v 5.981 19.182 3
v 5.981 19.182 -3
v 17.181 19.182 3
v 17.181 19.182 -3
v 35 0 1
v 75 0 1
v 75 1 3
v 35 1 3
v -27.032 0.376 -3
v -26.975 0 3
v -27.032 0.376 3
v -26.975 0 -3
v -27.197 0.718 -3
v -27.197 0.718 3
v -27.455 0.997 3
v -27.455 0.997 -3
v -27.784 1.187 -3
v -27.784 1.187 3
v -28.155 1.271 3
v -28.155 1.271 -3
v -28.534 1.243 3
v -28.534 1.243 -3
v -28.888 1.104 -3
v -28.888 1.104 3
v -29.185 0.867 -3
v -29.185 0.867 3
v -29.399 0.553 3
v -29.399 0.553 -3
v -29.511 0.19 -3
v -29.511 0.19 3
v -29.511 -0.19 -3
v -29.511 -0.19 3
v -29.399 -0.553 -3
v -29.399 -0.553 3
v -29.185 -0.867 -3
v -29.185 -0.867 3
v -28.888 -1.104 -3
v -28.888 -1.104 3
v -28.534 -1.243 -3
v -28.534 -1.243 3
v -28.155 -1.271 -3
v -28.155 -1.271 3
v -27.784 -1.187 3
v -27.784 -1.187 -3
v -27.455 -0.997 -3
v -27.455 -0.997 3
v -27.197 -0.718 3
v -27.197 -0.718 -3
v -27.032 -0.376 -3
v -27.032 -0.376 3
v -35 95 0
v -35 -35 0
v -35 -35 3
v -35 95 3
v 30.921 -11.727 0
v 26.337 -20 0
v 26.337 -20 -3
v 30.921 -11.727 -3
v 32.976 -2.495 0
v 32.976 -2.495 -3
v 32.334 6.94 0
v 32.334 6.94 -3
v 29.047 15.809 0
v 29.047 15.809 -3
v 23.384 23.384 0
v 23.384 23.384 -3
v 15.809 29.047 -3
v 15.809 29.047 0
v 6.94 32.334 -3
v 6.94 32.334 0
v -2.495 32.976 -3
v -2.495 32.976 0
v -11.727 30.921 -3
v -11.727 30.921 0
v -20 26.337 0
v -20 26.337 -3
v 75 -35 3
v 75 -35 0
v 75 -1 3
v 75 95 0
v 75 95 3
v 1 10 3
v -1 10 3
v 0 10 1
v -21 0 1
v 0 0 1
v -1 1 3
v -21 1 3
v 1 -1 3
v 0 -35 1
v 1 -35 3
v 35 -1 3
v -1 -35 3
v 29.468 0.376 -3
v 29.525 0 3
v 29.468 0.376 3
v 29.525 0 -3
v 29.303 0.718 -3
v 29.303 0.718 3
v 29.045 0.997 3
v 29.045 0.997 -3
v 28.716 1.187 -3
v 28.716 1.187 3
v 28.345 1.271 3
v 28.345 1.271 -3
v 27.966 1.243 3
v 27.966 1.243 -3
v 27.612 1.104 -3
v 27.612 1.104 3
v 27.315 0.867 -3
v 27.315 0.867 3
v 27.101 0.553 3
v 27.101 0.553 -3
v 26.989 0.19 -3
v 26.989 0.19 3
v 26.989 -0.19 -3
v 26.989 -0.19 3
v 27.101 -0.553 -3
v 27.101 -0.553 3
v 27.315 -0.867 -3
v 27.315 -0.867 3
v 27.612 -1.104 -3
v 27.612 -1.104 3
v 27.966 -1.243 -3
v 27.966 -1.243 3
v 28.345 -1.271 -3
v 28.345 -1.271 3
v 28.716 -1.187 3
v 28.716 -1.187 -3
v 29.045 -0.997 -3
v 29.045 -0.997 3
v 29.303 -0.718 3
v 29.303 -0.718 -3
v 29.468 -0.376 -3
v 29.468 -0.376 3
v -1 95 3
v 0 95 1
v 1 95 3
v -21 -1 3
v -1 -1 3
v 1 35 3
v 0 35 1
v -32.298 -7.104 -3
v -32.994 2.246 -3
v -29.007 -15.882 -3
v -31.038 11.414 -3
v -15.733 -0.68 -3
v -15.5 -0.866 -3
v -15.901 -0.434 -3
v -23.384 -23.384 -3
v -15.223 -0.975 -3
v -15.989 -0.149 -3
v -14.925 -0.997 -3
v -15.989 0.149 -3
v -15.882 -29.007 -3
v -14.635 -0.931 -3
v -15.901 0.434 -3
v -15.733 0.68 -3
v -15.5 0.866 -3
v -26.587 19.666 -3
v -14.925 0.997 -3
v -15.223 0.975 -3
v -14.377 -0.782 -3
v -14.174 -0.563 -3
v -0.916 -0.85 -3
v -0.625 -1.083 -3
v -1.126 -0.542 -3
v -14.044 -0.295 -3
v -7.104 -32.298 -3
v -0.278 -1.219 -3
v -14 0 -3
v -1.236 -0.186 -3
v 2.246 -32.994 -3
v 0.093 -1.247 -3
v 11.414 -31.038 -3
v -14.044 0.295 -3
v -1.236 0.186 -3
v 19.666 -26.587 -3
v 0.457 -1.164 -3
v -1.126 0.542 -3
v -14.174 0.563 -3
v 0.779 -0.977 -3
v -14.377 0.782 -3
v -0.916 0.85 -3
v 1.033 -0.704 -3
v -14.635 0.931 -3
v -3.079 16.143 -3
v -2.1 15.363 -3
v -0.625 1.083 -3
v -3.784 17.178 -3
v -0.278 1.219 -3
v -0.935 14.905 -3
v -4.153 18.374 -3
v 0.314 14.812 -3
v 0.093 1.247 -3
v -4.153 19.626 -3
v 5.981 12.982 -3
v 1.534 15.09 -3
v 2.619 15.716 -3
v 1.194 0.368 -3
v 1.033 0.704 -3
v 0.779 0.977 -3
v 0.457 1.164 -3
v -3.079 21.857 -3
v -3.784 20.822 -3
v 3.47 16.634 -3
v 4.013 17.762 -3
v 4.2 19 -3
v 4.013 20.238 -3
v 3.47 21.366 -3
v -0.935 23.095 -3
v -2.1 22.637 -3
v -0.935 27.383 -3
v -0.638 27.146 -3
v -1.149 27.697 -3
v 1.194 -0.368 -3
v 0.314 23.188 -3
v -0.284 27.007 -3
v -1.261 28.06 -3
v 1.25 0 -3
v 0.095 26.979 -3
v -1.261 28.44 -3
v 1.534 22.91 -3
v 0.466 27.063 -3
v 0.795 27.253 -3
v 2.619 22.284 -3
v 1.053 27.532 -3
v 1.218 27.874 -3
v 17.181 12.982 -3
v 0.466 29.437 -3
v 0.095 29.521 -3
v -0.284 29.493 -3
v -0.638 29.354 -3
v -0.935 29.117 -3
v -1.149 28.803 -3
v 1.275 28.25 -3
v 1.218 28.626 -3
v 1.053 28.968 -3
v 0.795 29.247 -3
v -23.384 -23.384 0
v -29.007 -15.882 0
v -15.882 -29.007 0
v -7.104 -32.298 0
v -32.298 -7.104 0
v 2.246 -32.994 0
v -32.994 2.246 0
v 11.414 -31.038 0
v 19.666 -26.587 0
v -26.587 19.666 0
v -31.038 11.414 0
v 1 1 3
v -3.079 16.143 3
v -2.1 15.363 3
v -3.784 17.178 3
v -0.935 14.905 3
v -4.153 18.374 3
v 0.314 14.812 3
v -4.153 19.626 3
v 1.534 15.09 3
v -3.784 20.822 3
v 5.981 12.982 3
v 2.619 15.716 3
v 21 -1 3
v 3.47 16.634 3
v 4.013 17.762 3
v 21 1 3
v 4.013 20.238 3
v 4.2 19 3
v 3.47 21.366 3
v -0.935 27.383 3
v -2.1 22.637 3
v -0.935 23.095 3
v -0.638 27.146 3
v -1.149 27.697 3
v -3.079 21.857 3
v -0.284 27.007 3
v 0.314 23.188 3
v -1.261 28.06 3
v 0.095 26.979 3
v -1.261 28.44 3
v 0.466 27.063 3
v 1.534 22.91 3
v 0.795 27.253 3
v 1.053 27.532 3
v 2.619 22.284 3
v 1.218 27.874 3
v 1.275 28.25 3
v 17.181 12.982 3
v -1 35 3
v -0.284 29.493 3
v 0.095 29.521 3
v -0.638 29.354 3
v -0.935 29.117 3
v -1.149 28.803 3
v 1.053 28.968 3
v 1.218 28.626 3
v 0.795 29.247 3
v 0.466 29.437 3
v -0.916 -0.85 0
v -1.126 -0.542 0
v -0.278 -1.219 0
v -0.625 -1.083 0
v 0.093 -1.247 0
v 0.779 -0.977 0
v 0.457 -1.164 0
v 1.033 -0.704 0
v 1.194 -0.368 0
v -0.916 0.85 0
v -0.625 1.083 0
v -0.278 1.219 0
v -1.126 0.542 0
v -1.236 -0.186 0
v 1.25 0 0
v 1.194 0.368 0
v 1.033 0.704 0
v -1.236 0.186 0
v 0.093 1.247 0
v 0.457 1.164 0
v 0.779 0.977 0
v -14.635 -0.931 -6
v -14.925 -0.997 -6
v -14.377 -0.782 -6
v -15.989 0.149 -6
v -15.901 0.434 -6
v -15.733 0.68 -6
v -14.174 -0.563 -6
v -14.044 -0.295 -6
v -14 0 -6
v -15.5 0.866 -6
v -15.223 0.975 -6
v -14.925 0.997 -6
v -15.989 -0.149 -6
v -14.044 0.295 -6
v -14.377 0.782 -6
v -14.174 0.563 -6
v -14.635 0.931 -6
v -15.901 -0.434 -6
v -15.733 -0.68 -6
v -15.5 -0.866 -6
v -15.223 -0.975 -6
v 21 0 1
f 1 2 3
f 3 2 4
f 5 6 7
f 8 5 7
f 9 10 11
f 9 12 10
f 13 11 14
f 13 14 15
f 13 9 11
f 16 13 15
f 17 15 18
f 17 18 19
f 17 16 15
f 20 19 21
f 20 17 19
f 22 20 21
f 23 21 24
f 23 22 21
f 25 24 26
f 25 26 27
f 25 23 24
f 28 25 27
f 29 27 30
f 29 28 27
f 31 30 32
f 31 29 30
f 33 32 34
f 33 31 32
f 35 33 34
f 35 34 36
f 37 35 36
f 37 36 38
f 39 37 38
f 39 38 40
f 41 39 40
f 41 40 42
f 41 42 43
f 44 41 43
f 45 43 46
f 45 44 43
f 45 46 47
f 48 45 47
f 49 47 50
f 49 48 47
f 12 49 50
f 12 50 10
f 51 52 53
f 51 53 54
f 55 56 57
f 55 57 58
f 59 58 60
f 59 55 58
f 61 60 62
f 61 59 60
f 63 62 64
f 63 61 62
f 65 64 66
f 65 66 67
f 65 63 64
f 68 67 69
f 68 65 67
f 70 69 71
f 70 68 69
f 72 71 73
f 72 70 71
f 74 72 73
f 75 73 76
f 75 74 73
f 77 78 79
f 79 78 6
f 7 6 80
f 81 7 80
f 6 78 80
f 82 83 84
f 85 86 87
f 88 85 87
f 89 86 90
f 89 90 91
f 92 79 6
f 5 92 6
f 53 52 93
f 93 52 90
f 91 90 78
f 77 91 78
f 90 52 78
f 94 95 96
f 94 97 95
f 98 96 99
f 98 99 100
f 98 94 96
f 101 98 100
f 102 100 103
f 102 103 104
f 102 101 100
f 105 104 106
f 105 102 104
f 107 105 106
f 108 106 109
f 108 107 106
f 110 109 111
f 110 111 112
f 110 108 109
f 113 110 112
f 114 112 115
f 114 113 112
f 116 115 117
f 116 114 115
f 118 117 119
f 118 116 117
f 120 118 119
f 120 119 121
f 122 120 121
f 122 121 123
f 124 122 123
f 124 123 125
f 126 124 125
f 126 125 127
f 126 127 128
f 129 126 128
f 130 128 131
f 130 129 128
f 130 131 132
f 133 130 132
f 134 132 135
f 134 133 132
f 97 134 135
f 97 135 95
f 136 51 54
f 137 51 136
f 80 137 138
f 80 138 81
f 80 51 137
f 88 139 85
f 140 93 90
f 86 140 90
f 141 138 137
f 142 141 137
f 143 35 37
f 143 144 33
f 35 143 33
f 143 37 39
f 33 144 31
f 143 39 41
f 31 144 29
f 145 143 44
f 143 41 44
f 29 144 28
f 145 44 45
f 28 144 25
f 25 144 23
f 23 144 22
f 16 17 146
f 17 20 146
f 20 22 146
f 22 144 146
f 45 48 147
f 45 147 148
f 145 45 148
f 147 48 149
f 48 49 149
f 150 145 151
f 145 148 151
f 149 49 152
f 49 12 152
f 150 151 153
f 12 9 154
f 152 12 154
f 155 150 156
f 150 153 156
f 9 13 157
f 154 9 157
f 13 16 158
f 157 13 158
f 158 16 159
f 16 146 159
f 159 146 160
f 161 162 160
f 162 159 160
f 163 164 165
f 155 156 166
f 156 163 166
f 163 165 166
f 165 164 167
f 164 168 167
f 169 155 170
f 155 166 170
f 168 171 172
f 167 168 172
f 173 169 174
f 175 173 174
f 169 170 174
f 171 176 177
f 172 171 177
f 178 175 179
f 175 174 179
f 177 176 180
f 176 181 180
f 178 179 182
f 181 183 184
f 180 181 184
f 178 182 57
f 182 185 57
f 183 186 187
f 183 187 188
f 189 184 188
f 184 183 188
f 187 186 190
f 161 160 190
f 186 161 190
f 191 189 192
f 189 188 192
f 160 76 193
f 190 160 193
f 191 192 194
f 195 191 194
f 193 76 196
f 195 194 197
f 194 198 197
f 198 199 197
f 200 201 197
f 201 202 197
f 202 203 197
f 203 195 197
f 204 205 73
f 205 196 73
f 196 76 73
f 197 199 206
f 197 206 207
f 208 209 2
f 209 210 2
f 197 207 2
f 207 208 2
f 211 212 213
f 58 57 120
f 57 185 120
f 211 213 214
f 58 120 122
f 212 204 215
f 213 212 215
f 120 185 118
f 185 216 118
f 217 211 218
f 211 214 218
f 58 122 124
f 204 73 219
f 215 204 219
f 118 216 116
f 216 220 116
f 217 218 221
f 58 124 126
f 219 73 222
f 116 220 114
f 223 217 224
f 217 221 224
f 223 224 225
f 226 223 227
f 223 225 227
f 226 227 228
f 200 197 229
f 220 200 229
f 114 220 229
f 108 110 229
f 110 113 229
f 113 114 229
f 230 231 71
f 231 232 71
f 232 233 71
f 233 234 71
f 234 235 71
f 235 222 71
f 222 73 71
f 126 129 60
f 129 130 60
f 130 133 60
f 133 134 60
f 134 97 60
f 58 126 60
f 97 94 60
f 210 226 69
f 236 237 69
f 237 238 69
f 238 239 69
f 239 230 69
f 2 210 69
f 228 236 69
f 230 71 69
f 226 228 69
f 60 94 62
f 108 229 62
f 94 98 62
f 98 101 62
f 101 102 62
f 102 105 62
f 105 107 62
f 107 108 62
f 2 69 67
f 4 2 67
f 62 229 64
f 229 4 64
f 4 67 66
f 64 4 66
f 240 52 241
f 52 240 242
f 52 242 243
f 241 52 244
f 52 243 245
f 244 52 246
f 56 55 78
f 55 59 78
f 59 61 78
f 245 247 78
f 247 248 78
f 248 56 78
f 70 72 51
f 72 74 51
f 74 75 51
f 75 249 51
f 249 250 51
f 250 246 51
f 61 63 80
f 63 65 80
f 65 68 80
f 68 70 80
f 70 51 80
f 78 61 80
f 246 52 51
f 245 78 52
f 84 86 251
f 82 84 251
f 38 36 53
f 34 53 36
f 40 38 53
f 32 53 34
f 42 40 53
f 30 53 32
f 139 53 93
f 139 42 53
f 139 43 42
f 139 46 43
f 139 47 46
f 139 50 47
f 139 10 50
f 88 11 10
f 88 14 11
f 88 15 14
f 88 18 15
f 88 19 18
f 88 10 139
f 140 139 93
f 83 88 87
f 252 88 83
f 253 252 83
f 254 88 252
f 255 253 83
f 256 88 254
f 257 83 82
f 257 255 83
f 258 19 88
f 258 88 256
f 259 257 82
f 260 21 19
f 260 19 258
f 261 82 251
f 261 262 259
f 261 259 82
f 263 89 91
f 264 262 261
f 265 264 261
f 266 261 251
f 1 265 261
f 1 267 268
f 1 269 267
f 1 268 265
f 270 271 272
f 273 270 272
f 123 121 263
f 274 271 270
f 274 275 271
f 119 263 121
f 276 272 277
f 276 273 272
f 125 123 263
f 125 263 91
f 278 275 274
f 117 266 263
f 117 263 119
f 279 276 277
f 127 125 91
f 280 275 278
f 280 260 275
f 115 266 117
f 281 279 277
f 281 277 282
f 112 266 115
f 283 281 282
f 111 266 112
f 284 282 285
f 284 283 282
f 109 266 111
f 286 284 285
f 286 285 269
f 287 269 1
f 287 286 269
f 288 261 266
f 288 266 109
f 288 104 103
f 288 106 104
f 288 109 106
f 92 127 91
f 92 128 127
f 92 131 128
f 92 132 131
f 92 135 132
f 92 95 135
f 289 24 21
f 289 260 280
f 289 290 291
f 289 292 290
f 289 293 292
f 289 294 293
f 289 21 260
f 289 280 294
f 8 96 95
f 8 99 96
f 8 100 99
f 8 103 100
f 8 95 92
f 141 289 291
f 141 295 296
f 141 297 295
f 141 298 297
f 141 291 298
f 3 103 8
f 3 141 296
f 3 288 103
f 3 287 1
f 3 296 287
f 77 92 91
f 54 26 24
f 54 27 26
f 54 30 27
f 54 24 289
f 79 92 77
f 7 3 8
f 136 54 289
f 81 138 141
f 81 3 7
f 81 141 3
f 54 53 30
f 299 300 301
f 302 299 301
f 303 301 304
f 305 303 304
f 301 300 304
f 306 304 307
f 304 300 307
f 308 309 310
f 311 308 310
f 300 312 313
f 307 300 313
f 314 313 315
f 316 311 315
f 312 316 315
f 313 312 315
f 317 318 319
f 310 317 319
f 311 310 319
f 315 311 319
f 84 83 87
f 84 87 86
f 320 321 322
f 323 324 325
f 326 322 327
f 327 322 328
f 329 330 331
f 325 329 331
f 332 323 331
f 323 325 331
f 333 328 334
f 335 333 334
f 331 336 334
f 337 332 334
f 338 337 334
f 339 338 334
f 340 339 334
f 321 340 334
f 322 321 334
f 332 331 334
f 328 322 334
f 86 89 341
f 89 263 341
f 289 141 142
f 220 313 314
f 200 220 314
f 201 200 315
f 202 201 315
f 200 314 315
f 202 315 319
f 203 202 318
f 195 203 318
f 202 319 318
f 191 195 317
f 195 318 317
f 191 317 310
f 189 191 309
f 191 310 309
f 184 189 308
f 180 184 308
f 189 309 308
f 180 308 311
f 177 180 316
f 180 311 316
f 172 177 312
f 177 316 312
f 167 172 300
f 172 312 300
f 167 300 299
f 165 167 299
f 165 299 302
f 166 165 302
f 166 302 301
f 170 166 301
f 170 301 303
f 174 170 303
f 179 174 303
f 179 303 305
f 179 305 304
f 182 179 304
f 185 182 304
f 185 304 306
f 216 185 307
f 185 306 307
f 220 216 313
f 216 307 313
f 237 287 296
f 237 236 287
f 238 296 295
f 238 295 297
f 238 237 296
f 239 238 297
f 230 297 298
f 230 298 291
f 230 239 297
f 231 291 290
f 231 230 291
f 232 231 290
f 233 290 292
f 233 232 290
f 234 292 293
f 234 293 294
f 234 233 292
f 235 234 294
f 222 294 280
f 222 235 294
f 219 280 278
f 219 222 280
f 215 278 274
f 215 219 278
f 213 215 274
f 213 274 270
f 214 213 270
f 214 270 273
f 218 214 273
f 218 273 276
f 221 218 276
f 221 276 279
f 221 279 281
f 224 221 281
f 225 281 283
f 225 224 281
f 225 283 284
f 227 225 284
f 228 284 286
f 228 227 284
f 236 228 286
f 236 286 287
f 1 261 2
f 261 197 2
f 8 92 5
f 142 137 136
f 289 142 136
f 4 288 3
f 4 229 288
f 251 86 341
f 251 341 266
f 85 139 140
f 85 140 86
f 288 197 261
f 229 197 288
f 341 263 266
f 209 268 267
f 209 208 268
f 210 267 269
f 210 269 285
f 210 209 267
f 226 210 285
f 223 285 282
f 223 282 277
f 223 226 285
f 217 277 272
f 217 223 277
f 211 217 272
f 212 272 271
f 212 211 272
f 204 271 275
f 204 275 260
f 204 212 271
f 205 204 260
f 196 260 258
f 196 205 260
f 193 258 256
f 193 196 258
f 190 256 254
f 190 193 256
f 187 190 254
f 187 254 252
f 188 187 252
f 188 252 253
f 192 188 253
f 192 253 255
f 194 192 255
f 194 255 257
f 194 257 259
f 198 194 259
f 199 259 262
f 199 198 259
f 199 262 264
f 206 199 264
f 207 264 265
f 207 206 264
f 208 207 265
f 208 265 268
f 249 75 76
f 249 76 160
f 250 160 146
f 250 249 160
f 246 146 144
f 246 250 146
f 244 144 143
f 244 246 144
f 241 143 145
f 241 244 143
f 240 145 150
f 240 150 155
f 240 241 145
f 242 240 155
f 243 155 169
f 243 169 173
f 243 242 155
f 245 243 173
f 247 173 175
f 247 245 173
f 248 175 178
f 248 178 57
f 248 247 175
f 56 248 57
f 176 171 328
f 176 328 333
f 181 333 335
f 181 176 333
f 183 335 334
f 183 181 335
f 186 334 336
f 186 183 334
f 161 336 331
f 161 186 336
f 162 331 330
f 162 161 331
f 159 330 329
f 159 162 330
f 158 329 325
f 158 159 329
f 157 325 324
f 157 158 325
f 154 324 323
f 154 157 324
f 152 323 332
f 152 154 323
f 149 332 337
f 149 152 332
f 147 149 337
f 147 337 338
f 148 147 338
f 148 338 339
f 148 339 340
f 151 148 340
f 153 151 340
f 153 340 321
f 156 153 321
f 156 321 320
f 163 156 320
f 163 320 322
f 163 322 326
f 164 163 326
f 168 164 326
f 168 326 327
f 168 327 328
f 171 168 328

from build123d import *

# Parameters (mm, degrees)
F0_R      = 1
F0_R_2    = 1.25
F0_R_3    = 4.2
F0_R_4    = 1.275
F0_W      = 11.2
F0_H      = 6.2
F1_DEPTH  = 3
F0_W_2    = 110
F0_H_2    = 130
F2_DEPTH  = 3
F3_DEPTH  = 6
F5_DEPTH  = 45
F7_DEPTH  = 60
F9_DEPTH  = 40
F11_DEPTH = 21


with BuildPart() as f1:
    # F0 (on Top) → F1 (new body)
    with BuildSketch(Plane.XY):
        with BuildLine():
            ThreePointArc((26.3367733861, -20), (31.3415301151, -10.5514985873), (33.0700110734, 0))
            ThreePointArc((33.0700110734, 0), (14.7007722744, 29.6228446799), (-20, 26.3367733861))
            Line((-20, 26.3367733861), (-20, -20))
            Line((-20, -20), (26.3367733861, -20))
        make_face()
        with Locations((-15, 3.4738e-06)):
            Circle(F0_R, mode=Mode.SUBTRACT)
        Circle(F0_R_2, mode=Mode.SUBTRACT)
        with Locations((-7.68e-08, 19)):
            Circle(F0_R_3, mode=Mode.SUBTRACT)
        with Locations((0, 28.25)):
            Circle(F0_R_4, mode=Mode.SUBTRACT)
        with Locations((11.580758131, 16.0824482103)):
            Rectangle(F0_W, F0_H, mode=Mode.SUBTRACT)
        with Locations((28.25, 0)):
            Circle(F0_R_4, mode=Mode.SUBTRACT)
        with BuildLine():
            Line((-20, -20), (-20, 26.3367733861))
            ThreePointArc((-20, 26.3367733861), (-23.3840290839, -23.3840290839), (26.3367733861, -20))
            Line((26.3367733861, -20), (-20, -20))
        make_face()
        with Locations((-28.25, 0)):
            Circle(F0_R_4, mode=Mode.SUBTRACT)
    extrude(amount=-F1_DEPTH)

    # F0 (on Top) → F2 (join)
    with BuildSketch(Plane.XY):
        with Locations((20, 30)):
            Rectangle(F0_W_2, F0_H_2)
        with BuildLine():
            ThreePointArc((26.3367733861, -20), (-23.3840290839, -23.3840290839), (-20, 26.3367733861))
            Line((-20, 26.3367733861), (-20, 80))
            Line((-20, 80), (60, 80))
            Line((60, 80), (60, -20))
            Line((60, -20), (26.3367733861, -20))
        make_face(mode=Mode.SUBTRACT)
        with BuildLine():
            ThreePointArc((26.3367733861, -20), (31.3415301151, -10.5514985873), (33.0700110734, 0))
            ThreePointArc((33.0700110734, 0), (14.7007722744, 29.6228446799), (-20, 26.3367733861))
            Line((-20, 26.3367733861), (-20, -20))
            Line((-20, -20), (26.3367733861, -20))
        make_face()
        with Locations((-15, 3.4738e-06)):
            Circle(F0_R, mode=Mode.SUBTRACT)
        Circle(F0_R_2, mode=Mode.SUBTRACT)
        with Locations((-7.68e-08, 19)):
            Circle(F0_R_3, mode=Mode.SUBTRACT)
        with Locations((0, 28.25)):
            Circle(F0_R_4, mode=Mode.SUBTRACT)
        with Locations((11.580758131, 16.0824482103)):
            Rectangle(F0_W, F0_H, mode=Mode.SUBTRACT)
        with Locations((28.25, 0)):
            Circle(F0_R_4, mode=Mode.SUBTRACT)
        with BuildLine():
            Line((-20, -20), (-20, 26.3367733861))
            ThreePointArc((-20, 26.3367733861), (-23.3840290839, -23.3840290839), (26.3367733861, -20))
            Line((26.3367733861, -20), (-20, -20))
        make_face()
        with Locations((-28.25, 0)):
            Circle(F0_R_4, mode=Mode.SUBTRACT)
        with BuildLine():
            ThreePointArc((-20, 26.3367733861), (14.7007722744, 29.6228446799), (33.0700110734, 0))
            ThreePointArc((33.0700110734, 0), (31.3415301151, -10.5514985873), (26.3367733861, -20))
            Line((26.3367733861, -20), (60, -20))
            Line((60, -20), (60, 80))
            Line((60, 80), (-20, 80))
            Line((-20, 80), (-20, 26.3367733861))
        make_face()
        with Locations((-15, 3.4738e-06)):
            Circle(F0_R)
        Circle(F0_R_2)
    extrude(amount=F2_DEPTH)

    # F0 (on Top) → F3 (join)
    with BuildSketch(Plane.XY):
        with Locations((-15, 3.4738e-06)):
            Circle(F0_R)
    extrude(amount=-F3_DEPTH)

    # F4 (on face) → F5 (cut)
    with BuildSketch(Plane.XZ.offset(35)):
        Polygon((1, 3), (-1, 3), (0, 1), align=None)
    extrude(amount=-F5_DEPTH, mode=Mode.SUBTRACT)

    # F6 (on face) → F7 (cut)
    with BuildSketch(Plane(origin=(0, 95, 0), x_dir=(-1, 0, 0), z_dir=(0, 1, 0))):
        Polygon((-1, 3), (0, 1), (1, 3), align=None)
    extrude(amount=-F7_DEPTH, mode=Mode.SUBTRACT)

    # F8 (on face) → F9 (cut)
    with BuildSketch(Plane.YZ.offset(75)):
        Polygon((1, 3), (-1, 3), (0, 1), align=None)
    extrude(amount=-F9_DEPTH, mode=Mode.SUBTRACT)

    # F10 (on Right) → F11 (cut, symmetric)
    with BuildSketch(Plane.YZ):
        Polygon((-1, 3), (0, 1), (1, 3), align=None)
    extrude(amount=F11_DEPTH, both=True, mode=Mode.SUBTRACT)


solid = f1.part
